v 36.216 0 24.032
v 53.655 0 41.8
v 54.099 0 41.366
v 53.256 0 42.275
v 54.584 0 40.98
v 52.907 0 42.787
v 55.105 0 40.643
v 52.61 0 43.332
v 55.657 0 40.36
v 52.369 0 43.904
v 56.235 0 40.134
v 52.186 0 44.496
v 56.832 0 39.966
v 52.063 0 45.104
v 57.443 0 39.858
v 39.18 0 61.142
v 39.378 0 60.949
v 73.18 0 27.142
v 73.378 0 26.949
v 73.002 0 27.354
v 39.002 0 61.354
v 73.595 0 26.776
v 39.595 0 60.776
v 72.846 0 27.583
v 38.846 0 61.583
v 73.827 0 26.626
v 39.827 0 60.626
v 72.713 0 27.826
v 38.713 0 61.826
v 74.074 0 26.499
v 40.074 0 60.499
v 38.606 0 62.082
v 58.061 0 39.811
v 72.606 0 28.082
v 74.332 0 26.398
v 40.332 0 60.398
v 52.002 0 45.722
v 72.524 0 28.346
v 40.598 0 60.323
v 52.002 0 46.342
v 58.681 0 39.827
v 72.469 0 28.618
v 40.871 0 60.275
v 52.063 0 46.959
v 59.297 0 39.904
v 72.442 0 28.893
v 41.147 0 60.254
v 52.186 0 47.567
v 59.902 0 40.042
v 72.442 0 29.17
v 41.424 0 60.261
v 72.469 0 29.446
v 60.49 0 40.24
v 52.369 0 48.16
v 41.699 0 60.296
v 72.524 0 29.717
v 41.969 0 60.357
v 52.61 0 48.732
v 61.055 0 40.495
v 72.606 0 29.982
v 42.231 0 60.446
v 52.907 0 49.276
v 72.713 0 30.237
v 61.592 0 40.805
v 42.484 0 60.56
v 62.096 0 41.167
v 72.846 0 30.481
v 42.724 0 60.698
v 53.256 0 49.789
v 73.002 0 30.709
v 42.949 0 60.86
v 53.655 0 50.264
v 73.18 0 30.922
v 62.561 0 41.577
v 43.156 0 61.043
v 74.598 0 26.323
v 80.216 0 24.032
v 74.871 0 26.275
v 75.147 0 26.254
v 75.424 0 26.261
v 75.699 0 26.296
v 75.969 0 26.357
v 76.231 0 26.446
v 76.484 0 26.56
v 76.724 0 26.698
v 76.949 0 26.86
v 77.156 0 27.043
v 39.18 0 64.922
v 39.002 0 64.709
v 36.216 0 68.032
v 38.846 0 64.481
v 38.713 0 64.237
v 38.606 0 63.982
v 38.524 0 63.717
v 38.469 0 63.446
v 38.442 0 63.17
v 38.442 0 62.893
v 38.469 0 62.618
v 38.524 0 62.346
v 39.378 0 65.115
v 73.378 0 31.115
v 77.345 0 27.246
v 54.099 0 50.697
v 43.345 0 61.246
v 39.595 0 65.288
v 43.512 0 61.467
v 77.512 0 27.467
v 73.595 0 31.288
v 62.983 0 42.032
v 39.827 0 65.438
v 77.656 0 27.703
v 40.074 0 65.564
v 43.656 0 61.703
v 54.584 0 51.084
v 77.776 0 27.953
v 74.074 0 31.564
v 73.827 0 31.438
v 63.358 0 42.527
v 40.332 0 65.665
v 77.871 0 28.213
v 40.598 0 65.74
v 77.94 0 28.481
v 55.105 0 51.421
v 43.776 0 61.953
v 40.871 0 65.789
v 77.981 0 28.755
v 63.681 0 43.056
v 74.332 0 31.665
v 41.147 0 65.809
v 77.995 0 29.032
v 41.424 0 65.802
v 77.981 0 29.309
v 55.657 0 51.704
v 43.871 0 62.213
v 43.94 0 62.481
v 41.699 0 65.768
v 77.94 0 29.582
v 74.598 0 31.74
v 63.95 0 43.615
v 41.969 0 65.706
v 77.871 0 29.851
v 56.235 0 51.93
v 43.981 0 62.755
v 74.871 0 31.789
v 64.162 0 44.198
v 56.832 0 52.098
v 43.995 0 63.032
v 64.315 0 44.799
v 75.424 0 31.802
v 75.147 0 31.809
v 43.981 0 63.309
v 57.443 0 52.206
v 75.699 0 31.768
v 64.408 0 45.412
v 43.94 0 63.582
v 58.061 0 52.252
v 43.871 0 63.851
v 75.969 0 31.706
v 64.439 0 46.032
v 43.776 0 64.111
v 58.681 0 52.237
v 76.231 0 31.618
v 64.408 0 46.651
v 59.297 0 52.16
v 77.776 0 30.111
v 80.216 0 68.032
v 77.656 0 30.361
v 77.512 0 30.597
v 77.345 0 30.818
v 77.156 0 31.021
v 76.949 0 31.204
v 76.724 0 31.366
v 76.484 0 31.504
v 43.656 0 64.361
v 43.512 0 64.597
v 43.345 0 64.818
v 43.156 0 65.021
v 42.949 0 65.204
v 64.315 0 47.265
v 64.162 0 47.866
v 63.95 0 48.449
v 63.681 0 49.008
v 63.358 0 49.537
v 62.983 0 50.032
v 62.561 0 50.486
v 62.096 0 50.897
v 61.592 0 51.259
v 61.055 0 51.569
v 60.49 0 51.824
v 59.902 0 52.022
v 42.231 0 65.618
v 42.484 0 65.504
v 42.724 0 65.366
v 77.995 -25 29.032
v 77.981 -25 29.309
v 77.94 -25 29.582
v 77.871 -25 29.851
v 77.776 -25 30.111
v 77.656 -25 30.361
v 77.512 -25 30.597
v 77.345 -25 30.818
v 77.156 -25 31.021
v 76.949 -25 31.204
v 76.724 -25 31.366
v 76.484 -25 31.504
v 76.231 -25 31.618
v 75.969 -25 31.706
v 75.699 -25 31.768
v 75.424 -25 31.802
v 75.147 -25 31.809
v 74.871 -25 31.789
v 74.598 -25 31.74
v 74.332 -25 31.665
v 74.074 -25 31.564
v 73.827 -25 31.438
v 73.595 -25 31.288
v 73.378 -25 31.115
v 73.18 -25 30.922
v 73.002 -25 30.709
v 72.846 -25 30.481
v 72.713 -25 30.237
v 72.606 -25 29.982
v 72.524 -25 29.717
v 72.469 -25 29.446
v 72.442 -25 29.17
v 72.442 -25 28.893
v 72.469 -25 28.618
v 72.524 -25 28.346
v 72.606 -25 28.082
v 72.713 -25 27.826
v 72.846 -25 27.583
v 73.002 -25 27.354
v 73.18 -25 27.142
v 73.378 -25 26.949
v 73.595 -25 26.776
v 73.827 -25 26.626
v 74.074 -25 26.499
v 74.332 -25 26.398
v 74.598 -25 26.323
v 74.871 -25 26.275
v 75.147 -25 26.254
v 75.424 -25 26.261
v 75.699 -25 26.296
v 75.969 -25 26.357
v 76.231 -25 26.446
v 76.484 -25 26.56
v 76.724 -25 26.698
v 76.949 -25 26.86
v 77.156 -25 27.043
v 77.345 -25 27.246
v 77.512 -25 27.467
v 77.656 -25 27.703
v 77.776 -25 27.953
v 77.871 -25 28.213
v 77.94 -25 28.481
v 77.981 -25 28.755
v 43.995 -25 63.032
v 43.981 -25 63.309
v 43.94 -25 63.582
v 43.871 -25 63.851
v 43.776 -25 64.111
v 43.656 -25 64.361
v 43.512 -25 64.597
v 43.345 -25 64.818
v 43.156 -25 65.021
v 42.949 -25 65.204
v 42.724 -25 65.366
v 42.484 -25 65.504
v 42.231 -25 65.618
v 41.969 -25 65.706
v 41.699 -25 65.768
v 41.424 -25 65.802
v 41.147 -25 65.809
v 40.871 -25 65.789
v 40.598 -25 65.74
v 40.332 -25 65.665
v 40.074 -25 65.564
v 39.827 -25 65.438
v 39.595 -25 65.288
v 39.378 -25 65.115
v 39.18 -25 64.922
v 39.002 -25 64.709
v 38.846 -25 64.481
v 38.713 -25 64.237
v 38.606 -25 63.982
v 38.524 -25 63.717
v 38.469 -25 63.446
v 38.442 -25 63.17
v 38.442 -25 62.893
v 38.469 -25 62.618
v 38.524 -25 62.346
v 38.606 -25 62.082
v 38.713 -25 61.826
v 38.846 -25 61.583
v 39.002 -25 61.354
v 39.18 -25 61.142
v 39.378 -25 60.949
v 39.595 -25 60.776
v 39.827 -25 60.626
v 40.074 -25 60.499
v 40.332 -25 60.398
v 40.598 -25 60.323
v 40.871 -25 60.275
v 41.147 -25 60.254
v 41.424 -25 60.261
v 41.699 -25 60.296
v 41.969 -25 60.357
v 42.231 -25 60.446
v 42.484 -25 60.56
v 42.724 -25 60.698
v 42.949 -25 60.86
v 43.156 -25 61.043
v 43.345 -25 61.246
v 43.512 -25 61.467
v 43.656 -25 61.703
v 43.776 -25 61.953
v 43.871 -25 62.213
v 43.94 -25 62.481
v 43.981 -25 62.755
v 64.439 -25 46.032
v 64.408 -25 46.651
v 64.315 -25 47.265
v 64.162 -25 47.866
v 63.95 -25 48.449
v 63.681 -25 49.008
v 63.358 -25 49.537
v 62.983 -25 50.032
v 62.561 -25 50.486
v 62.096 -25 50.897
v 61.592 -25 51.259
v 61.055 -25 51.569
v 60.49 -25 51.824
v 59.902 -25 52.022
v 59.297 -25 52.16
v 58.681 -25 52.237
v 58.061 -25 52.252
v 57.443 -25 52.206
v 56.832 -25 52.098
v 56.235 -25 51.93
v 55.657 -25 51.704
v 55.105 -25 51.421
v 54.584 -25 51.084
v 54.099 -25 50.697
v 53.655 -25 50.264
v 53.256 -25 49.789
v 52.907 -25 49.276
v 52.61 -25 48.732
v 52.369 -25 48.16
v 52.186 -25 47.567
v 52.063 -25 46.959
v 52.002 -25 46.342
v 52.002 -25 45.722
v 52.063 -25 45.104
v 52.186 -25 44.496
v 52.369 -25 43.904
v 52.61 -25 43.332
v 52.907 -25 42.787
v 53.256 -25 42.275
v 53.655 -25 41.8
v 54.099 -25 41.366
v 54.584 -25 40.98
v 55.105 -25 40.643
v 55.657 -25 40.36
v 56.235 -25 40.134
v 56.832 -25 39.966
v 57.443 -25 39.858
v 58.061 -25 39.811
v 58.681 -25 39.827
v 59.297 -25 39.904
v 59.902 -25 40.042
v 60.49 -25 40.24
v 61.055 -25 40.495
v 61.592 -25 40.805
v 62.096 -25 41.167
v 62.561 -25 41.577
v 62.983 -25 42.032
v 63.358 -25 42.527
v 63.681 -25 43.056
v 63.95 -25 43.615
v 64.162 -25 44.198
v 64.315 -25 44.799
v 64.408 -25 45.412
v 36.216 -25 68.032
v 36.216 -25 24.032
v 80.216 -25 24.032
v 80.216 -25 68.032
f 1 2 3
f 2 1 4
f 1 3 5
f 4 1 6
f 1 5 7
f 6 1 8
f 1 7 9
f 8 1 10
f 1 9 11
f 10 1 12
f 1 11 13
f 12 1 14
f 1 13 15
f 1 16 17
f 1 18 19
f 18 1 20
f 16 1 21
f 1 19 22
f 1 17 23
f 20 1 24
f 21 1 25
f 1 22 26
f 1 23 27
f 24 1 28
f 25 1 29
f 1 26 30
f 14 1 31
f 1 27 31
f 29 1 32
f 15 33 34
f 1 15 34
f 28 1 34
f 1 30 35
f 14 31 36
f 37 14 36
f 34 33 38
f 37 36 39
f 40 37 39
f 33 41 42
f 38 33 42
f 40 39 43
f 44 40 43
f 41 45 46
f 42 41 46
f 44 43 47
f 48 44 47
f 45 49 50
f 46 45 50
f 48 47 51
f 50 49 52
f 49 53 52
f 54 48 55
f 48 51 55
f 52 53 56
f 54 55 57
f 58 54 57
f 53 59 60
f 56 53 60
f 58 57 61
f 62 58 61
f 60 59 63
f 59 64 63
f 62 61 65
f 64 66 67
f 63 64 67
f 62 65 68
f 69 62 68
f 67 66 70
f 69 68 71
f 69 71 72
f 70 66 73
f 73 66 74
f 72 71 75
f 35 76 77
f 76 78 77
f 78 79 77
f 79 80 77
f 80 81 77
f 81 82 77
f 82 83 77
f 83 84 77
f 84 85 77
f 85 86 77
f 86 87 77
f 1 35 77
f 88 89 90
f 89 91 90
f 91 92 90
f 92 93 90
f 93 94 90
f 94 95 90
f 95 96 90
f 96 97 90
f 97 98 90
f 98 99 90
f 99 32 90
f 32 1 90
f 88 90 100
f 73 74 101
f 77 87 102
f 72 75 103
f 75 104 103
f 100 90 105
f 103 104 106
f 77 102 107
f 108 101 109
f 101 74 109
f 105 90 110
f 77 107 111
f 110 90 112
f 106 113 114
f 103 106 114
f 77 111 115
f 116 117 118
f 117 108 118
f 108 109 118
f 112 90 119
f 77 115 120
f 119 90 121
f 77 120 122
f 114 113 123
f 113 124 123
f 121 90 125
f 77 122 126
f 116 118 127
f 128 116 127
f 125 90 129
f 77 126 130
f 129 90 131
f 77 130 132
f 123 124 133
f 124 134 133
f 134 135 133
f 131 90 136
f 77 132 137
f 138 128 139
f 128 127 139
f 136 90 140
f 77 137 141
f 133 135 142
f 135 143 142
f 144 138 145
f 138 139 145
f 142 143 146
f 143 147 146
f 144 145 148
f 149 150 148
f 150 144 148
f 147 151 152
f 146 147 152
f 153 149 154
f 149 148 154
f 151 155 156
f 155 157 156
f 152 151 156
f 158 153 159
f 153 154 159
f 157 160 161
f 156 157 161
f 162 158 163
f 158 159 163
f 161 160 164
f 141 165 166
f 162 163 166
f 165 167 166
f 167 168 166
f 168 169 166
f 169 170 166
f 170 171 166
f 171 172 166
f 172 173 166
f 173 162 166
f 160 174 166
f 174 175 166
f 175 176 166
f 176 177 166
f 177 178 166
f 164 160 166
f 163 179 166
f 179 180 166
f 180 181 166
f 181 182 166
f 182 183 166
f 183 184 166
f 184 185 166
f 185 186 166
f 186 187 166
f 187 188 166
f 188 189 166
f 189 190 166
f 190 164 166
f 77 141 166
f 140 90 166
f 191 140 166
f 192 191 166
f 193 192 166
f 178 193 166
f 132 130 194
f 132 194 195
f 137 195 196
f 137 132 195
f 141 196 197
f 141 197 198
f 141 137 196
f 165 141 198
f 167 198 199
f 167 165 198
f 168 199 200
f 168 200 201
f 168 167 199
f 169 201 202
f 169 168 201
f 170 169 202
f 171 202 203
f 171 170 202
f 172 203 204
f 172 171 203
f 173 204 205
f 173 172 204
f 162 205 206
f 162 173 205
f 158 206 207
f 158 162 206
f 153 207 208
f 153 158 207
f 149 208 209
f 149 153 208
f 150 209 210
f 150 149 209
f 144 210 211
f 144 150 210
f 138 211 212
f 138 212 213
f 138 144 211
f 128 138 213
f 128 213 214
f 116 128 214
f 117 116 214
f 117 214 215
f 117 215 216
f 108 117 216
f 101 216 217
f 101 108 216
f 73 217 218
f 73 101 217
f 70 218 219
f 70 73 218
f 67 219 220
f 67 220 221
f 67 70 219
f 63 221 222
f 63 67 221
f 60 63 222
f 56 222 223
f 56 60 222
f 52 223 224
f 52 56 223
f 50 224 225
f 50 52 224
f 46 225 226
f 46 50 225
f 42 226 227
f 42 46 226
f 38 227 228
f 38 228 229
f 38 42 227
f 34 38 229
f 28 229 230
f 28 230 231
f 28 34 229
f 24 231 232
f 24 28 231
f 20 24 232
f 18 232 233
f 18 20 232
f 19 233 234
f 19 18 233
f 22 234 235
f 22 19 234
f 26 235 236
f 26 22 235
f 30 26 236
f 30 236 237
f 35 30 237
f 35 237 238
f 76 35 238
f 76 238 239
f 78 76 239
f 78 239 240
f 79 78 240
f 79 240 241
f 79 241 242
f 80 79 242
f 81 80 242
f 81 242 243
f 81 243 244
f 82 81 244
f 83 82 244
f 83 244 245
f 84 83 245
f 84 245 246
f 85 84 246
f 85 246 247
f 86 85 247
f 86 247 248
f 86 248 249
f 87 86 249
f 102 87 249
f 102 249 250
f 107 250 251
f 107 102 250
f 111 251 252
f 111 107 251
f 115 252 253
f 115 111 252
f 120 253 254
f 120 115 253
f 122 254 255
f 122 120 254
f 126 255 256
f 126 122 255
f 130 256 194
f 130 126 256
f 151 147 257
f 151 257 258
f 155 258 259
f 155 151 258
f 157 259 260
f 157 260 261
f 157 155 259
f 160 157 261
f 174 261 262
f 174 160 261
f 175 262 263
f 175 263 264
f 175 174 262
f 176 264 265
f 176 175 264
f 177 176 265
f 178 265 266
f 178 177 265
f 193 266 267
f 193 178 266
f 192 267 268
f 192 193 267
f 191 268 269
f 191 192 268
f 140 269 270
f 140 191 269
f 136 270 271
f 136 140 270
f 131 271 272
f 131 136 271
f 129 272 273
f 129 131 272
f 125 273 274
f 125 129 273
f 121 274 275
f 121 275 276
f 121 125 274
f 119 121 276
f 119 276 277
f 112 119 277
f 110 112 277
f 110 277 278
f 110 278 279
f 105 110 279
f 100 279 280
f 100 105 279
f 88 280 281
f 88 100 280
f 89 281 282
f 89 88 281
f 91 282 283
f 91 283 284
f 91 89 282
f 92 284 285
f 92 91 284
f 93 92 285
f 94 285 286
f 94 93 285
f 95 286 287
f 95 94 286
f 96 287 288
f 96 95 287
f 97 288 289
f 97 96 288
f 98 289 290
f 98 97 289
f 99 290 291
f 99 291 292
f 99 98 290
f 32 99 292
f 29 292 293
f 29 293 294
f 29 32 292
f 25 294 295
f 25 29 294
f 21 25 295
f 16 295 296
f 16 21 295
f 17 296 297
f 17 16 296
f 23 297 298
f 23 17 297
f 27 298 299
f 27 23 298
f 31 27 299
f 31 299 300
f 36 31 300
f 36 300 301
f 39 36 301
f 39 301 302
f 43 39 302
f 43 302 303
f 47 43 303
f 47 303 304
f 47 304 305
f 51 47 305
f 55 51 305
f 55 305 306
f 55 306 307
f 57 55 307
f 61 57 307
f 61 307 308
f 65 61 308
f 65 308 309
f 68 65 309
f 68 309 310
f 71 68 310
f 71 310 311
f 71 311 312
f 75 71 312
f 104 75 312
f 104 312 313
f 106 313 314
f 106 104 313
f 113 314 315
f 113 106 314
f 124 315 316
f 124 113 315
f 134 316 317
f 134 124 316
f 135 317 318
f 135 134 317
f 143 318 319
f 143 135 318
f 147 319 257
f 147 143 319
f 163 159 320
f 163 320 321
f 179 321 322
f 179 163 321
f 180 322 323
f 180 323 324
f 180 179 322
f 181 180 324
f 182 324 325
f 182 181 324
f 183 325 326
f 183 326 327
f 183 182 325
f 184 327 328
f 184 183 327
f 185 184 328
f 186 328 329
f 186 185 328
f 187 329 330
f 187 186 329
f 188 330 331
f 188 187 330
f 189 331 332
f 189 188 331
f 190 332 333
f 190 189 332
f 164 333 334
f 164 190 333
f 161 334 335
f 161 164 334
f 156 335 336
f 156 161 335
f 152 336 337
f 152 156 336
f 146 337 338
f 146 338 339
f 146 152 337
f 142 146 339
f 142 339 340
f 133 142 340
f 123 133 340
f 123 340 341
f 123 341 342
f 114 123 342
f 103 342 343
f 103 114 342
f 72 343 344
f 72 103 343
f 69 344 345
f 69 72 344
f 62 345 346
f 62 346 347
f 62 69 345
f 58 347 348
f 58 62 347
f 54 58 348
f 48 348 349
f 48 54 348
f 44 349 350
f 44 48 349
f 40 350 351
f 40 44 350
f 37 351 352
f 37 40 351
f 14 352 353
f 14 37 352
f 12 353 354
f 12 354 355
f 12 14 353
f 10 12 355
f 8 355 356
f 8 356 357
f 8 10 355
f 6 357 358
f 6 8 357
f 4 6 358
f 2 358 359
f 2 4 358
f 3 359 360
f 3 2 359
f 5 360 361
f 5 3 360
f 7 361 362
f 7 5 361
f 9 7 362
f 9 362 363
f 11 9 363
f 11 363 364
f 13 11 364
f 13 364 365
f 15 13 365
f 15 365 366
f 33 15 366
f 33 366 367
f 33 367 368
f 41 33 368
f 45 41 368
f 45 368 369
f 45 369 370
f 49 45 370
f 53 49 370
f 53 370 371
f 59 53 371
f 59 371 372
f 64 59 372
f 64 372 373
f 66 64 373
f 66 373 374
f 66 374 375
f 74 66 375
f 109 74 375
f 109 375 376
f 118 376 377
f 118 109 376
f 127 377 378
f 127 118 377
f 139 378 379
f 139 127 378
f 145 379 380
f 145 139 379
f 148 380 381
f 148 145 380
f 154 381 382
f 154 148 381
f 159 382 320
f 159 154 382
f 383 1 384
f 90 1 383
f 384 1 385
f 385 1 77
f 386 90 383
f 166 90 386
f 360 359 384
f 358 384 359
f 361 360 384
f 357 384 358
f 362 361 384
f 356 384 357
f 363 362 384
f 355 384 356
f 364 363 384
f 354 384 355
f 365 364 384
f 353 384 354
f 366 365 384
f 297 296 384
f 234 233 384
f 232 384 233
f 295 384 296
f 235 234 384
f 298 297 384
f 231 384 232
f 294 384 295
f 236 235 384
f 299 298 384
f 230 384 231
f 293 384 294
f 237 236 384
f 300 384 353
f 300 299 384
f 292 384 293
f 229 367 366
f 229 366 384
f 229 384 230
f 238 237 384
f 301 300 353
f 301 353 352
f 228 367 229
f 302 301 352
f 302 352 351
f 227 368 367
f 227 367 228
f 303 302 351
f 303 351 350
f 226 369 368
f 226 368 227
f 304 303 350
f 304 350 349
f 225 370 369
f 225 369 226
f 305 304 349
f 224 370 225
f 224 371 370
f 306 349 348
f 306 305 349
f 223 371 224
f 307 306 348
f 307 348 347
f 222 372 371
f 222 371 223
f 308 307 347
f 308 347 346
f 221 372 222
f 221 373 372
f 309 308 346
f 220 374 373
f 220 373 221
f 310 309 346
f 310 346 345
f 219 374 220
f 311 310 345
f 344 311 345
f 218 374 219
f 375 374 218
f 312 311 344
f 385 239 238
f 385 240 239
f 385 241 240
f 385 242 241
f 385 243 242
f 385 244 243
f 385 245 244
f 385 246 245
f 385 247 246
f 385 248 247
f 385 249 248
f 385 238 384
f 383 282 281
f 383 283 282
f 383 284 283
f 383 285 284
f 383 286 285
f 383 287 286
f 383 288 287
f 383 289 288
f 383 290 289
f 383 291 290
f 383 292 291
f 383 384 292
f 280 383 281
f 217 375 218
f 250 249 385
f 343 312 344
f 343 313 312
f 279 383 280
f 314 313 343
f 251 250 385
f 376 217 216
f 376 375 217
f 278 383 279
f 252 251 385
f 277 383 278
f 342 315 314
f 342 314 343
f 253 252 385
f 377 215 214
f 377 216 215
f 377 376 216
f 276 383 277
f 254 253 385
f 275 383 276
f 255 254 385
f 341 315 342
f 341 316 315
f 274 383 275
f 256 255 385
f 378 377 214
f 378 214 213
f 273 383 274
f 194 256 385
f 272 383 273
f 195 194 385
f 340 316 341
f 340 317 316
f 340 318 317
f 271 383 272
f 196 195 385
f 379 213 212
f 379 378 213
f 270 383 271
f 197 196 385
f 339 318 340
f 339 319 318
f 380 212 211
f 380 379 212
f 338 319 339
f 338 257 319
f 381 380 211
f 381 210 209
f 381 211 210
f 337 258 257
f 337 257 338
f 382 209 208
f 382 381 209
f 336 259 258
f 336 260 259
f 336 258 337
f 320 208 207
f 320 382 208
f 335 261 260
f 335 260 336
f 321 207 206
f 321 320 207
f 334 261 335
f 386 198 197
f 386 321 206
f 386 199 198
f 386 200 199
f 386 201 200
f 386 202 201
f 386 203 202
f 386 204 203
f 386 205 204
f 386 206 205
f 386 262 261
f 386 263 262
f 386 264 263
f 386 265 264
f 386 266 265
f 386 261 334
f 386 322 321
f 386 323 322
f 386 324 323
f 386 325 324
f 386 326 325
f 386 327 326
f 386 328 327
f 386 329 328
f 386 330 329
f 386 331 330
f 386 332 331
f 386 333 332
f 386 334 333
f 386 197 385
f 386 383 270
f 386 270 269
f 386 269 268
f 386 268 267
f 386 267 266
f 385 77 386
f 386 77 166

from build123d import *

# Parameters (mm, degrees)
F0_W     = 44
F0_H     = 44
F0_R     = 6.222357
F0_R_2   = 2.778255
F1_DEPTH = 25


with BuildPart() as f1:
    # F0 (on Front) → F1 (new body)
    with BuildSketch(Plane.XZ):
        with Locations((58.216352, 46.031879)):
            Rectangle(F0_W, F0_H)
        with Locations((58.216352, 46.031879)):
            Circle(F0_R, mode=Mode.SUBTRACT)
        with Locations((75.216352, 29.031879)):
            Circle(F0_R_2, mode=Mode.SUBTRACT)
        with Locations((41.216352, 63.031879)):
            Circle(F0_R_2, mode=Mode.SUBTRACT)
    extrude(amount=F1_DEPTH)


solid = f1.part
